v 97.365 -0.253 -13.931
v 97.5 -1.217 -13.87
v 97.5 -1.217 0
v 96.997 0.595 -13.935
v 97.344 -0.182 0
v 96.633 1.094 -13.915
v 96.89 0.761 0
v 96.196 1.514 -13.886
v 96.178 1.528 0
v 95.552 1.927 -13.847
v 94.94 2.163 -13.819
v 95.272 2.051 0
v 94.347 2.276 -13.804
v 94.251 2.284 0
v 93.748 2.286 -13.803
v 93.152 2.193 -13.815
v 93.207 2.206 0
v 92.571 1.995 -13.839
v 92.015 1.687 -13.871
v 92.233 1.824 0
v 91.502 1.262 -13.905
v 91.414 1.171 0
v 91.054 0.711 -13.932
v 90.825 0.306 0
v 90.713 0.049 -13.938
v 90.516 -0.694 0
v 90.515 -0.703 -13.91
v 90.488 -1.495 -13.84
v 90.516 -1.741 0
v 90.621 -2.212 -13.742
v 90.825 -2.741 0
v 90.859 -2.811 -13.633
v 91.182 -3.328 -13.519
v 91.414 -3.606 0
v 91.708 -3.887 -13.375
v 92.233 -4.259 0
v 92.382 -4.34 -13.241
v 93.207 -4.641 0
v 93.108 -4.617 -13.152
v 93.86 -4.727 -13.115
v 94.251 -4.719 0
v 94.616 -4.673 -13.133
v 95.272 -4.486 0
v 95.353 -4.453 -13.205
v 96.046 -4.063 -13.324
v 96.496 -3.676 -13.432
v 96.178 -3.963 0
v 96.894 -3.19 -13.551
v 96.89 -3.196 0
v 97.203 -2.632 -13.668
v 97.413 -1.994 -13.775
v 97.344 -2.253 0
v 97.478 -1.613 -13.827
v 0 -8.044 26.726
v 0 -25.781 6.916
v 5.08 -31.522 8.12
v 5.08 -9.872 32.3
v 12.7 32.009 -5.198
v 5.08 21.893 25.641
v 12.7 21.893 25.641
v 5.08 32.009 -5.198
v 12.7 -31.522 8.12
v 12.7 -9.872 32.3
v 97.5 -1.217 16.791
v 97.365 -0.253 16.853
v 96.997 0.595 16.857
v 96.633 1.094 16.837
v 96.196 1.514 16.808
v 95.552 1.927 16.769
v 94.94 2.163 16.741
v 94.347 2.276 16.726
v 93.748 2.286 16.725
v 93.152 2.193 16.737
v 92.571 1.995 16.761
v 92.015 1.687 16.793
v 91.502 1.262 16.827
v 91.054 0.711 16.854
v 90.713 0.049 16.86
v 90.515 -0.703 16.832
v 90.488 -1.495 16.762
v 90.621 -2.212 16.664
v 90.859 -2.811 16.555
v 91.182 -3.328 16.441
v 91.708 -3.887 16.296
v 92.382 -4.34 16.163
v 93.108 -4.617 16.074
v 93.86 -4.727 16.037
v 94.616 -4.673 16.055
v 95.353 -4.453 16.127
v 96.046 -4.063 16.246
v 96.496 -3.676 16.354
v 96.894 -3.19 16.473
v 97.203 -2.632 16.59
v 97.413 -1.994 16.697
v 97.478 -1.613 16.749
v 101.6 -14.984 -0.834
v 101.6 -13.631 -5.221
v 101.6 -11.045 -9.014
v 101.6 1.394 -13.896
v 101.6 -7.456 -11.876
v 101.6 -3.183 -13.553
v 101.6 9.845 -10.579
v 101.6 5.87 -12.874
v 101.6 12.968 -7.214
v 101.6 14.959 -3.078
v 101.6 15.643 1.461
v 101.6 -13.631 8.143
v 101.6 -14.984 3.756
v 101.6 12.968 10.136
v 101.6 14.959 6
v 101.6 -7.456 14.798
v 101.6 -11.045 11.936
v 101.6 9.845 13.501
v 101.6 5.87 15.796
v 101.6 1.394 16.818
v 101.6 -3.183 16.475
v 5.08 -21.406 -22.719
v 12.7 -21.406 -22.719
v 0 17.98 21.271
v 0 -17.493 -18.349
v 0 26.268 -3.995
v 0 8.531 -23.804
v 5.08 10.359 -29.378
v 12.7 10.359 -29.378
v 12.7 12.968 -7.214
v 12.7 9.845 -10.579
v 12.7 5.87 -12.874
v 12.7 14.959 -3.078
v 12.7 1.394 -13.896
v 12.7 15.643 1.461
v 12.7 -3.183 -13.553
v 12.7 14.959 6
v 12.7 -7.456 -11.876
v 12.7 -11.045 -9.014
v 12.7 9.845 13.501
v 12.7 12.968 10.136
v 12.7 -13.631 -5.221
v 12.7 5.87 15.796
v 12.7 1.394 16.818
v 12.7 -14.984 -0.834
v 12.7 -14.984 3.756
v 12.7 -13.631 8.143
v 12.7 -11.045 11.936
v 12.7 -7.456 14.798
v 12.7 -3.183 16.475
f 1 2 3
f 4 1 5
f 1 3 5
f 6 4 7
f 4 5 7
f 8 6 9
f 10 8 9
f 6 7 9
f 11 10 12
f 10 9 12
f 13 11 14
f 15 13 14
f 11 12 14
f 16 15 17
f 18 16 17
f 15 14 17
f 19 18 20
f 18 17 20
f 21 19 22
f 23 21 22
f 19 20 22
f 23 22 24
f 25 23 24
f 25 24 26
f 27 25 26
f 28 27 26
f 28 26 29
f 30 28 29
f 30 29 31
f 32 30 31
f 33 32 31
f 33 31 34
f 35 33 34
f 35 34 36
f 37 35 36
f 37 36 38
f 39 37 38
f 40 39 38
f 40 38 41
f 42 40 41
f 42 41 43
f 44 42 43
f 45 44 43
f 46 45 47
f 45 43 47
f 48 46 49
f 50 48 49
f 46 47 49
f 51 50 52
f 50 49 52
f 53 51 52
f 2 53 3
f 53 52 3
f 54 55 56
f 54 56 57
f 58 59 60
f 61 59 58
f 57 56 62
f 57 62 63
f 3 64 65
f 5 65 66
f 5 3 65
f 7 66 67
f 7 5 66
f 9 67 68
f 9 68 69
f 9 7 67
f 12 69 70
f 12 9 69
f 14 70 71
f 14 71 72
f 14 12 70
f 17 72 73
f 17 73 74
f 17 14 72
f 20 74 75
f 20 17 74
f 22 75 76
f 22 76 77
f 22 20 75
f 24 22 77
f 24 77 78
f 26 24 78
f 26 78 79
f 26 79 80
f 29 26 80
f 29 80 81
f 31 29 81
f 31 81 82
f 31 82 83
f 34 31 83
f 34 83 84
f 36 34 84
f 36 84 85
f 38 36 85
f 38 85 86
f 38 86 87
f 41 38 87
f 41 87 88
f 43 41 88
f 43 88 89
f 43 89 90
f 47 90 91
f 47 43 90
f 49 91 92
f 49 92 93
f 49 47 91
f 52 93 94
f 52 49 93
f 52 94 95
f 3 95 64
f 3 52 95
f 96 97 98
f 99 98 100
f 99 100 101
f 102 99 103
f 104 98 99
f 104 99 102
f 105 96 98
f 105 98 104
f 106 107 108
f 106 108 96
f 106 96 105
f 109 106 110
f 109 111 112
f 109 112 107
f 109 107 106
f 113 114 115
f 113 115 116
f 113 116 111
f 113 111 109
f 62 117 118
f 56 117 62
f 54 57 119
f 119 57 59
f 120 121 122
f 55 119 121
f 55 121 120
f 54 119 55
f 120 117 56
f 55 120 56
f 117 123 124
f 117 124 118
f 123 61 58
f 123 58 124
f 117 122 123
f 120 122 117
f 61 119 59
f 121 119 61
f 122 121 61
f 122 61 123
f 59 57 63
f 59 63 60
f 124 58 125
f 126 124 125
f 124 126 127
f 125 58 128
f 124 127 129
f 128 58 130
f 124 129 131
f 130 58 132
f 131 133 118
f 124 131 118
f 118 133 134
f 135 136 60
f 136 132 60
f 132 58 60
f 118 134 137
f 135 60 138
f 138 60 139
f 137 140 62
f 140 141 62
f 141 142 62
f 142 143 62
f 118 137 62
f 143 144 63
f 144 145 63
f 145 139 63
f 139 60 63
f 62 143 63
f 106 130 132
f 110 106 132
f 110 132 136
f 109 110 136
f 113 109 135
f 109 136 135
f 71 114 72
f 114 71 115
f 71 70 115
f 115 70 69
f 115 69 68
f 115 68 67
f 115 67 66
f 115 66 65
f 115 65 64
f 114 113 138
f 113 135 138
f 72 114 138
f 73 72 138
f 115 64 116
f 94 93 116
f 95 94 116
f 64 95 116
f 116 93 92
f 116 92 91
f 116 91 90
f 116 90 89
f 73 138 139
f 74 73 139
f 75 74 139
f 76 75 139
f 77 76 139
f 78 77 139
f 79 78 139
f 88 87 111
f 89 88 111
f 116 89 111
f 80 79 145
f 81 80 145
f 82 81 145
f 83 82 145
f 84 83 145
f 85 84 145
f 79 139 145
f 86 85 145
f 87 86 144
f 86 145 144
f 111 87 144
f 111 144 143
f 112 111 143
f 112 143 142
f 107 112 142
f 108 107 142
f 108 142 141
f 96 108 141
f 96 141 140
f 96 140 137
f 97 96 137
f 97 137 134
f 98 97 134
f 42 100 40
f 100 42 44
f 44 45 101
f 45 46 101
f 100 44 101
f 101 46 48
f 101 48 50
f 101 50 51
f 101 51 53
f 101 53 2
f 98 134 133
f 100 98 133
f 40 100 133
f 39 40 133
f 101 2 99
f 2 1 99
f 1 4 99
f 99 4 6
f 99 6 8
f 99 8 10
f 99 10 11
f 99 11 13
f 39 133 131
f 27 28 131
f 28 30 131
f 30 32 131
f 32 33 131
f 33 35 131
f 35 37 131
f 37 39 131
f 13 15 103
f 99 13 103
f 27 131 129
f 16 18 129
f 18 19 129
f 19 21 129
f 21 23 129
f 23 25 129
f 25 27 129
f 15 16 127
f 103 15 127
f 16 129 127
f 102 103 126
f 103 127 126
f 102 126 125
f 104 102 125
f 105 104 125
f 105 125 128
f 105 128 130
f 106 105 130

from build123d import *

# Parameters (mm, degrees)
F0_R          = 15.399925
F1_DEPTH      = 101.6
F2_R          = 15.399925
F3_DEPTH      = 12.7
F4_SIZE       = 5.08
F5_R          = 3.511723
F6_DEPTH      = 32.301025
F6_DEPTH_BACK = 29.379094


with BuildPart() as f1:
    # F0 (on Right) → F1 (new body)
    with BuildSketch(Plane.YZ):
        with Locations((0.243489, 1.460966)):
            Circle(F0_R)
    extrude(amount=F1_DEPTH)

    # F2 (on face) → F3 (join)
    with BuildSketch(Plane(origin=(0, 0, 0), x_dir=(0, -1, 0), z_dir=(-1, 0, 0))):
        Polygon((31.521783, 8.120019), (9.872238, 32.300025), (-21.893034, 25.640972), (-32.008761, -5.198088), (-10.359216, -29.378094), (21.406057, -22.71904), align=None)
        with Locations((-0.243489, 1.460966)):
            Circle(F2_R, mode=Mode.SUBTRACT)
    extrude(amount=-F3_DEPTH)

    # F4
    f4_edges = [f1.edges().sort_by_distance(p)[0] for p in [
        (0, 26.950898, 10.221442),
        (0, 6.010398, 28.970498),
        (0, -20.697011, 20.210022),
        (0, -26.46392, -7.299511),
        (0, -5.52342, -26.048567),
        (0, 21.183988, -17.288091),
    ]]
    chamfer(f4_edges, length=F4_SIZE)

    # F5 (on Top) → F6 (cut, two sides)
    with BuildSketch(Plane.XY) as f6_sk:
        with Locations((93.988761, -1.217474)):
            Circle(F5_R)
    extrude(amount=F6_DEPTH, mode=Mode.SUBTRACT)
    extrude(f6_sk.sketch, amount=-F6_DEPTH_BACK, mode=Mode.SUBTRACT)


solid = f1.part
